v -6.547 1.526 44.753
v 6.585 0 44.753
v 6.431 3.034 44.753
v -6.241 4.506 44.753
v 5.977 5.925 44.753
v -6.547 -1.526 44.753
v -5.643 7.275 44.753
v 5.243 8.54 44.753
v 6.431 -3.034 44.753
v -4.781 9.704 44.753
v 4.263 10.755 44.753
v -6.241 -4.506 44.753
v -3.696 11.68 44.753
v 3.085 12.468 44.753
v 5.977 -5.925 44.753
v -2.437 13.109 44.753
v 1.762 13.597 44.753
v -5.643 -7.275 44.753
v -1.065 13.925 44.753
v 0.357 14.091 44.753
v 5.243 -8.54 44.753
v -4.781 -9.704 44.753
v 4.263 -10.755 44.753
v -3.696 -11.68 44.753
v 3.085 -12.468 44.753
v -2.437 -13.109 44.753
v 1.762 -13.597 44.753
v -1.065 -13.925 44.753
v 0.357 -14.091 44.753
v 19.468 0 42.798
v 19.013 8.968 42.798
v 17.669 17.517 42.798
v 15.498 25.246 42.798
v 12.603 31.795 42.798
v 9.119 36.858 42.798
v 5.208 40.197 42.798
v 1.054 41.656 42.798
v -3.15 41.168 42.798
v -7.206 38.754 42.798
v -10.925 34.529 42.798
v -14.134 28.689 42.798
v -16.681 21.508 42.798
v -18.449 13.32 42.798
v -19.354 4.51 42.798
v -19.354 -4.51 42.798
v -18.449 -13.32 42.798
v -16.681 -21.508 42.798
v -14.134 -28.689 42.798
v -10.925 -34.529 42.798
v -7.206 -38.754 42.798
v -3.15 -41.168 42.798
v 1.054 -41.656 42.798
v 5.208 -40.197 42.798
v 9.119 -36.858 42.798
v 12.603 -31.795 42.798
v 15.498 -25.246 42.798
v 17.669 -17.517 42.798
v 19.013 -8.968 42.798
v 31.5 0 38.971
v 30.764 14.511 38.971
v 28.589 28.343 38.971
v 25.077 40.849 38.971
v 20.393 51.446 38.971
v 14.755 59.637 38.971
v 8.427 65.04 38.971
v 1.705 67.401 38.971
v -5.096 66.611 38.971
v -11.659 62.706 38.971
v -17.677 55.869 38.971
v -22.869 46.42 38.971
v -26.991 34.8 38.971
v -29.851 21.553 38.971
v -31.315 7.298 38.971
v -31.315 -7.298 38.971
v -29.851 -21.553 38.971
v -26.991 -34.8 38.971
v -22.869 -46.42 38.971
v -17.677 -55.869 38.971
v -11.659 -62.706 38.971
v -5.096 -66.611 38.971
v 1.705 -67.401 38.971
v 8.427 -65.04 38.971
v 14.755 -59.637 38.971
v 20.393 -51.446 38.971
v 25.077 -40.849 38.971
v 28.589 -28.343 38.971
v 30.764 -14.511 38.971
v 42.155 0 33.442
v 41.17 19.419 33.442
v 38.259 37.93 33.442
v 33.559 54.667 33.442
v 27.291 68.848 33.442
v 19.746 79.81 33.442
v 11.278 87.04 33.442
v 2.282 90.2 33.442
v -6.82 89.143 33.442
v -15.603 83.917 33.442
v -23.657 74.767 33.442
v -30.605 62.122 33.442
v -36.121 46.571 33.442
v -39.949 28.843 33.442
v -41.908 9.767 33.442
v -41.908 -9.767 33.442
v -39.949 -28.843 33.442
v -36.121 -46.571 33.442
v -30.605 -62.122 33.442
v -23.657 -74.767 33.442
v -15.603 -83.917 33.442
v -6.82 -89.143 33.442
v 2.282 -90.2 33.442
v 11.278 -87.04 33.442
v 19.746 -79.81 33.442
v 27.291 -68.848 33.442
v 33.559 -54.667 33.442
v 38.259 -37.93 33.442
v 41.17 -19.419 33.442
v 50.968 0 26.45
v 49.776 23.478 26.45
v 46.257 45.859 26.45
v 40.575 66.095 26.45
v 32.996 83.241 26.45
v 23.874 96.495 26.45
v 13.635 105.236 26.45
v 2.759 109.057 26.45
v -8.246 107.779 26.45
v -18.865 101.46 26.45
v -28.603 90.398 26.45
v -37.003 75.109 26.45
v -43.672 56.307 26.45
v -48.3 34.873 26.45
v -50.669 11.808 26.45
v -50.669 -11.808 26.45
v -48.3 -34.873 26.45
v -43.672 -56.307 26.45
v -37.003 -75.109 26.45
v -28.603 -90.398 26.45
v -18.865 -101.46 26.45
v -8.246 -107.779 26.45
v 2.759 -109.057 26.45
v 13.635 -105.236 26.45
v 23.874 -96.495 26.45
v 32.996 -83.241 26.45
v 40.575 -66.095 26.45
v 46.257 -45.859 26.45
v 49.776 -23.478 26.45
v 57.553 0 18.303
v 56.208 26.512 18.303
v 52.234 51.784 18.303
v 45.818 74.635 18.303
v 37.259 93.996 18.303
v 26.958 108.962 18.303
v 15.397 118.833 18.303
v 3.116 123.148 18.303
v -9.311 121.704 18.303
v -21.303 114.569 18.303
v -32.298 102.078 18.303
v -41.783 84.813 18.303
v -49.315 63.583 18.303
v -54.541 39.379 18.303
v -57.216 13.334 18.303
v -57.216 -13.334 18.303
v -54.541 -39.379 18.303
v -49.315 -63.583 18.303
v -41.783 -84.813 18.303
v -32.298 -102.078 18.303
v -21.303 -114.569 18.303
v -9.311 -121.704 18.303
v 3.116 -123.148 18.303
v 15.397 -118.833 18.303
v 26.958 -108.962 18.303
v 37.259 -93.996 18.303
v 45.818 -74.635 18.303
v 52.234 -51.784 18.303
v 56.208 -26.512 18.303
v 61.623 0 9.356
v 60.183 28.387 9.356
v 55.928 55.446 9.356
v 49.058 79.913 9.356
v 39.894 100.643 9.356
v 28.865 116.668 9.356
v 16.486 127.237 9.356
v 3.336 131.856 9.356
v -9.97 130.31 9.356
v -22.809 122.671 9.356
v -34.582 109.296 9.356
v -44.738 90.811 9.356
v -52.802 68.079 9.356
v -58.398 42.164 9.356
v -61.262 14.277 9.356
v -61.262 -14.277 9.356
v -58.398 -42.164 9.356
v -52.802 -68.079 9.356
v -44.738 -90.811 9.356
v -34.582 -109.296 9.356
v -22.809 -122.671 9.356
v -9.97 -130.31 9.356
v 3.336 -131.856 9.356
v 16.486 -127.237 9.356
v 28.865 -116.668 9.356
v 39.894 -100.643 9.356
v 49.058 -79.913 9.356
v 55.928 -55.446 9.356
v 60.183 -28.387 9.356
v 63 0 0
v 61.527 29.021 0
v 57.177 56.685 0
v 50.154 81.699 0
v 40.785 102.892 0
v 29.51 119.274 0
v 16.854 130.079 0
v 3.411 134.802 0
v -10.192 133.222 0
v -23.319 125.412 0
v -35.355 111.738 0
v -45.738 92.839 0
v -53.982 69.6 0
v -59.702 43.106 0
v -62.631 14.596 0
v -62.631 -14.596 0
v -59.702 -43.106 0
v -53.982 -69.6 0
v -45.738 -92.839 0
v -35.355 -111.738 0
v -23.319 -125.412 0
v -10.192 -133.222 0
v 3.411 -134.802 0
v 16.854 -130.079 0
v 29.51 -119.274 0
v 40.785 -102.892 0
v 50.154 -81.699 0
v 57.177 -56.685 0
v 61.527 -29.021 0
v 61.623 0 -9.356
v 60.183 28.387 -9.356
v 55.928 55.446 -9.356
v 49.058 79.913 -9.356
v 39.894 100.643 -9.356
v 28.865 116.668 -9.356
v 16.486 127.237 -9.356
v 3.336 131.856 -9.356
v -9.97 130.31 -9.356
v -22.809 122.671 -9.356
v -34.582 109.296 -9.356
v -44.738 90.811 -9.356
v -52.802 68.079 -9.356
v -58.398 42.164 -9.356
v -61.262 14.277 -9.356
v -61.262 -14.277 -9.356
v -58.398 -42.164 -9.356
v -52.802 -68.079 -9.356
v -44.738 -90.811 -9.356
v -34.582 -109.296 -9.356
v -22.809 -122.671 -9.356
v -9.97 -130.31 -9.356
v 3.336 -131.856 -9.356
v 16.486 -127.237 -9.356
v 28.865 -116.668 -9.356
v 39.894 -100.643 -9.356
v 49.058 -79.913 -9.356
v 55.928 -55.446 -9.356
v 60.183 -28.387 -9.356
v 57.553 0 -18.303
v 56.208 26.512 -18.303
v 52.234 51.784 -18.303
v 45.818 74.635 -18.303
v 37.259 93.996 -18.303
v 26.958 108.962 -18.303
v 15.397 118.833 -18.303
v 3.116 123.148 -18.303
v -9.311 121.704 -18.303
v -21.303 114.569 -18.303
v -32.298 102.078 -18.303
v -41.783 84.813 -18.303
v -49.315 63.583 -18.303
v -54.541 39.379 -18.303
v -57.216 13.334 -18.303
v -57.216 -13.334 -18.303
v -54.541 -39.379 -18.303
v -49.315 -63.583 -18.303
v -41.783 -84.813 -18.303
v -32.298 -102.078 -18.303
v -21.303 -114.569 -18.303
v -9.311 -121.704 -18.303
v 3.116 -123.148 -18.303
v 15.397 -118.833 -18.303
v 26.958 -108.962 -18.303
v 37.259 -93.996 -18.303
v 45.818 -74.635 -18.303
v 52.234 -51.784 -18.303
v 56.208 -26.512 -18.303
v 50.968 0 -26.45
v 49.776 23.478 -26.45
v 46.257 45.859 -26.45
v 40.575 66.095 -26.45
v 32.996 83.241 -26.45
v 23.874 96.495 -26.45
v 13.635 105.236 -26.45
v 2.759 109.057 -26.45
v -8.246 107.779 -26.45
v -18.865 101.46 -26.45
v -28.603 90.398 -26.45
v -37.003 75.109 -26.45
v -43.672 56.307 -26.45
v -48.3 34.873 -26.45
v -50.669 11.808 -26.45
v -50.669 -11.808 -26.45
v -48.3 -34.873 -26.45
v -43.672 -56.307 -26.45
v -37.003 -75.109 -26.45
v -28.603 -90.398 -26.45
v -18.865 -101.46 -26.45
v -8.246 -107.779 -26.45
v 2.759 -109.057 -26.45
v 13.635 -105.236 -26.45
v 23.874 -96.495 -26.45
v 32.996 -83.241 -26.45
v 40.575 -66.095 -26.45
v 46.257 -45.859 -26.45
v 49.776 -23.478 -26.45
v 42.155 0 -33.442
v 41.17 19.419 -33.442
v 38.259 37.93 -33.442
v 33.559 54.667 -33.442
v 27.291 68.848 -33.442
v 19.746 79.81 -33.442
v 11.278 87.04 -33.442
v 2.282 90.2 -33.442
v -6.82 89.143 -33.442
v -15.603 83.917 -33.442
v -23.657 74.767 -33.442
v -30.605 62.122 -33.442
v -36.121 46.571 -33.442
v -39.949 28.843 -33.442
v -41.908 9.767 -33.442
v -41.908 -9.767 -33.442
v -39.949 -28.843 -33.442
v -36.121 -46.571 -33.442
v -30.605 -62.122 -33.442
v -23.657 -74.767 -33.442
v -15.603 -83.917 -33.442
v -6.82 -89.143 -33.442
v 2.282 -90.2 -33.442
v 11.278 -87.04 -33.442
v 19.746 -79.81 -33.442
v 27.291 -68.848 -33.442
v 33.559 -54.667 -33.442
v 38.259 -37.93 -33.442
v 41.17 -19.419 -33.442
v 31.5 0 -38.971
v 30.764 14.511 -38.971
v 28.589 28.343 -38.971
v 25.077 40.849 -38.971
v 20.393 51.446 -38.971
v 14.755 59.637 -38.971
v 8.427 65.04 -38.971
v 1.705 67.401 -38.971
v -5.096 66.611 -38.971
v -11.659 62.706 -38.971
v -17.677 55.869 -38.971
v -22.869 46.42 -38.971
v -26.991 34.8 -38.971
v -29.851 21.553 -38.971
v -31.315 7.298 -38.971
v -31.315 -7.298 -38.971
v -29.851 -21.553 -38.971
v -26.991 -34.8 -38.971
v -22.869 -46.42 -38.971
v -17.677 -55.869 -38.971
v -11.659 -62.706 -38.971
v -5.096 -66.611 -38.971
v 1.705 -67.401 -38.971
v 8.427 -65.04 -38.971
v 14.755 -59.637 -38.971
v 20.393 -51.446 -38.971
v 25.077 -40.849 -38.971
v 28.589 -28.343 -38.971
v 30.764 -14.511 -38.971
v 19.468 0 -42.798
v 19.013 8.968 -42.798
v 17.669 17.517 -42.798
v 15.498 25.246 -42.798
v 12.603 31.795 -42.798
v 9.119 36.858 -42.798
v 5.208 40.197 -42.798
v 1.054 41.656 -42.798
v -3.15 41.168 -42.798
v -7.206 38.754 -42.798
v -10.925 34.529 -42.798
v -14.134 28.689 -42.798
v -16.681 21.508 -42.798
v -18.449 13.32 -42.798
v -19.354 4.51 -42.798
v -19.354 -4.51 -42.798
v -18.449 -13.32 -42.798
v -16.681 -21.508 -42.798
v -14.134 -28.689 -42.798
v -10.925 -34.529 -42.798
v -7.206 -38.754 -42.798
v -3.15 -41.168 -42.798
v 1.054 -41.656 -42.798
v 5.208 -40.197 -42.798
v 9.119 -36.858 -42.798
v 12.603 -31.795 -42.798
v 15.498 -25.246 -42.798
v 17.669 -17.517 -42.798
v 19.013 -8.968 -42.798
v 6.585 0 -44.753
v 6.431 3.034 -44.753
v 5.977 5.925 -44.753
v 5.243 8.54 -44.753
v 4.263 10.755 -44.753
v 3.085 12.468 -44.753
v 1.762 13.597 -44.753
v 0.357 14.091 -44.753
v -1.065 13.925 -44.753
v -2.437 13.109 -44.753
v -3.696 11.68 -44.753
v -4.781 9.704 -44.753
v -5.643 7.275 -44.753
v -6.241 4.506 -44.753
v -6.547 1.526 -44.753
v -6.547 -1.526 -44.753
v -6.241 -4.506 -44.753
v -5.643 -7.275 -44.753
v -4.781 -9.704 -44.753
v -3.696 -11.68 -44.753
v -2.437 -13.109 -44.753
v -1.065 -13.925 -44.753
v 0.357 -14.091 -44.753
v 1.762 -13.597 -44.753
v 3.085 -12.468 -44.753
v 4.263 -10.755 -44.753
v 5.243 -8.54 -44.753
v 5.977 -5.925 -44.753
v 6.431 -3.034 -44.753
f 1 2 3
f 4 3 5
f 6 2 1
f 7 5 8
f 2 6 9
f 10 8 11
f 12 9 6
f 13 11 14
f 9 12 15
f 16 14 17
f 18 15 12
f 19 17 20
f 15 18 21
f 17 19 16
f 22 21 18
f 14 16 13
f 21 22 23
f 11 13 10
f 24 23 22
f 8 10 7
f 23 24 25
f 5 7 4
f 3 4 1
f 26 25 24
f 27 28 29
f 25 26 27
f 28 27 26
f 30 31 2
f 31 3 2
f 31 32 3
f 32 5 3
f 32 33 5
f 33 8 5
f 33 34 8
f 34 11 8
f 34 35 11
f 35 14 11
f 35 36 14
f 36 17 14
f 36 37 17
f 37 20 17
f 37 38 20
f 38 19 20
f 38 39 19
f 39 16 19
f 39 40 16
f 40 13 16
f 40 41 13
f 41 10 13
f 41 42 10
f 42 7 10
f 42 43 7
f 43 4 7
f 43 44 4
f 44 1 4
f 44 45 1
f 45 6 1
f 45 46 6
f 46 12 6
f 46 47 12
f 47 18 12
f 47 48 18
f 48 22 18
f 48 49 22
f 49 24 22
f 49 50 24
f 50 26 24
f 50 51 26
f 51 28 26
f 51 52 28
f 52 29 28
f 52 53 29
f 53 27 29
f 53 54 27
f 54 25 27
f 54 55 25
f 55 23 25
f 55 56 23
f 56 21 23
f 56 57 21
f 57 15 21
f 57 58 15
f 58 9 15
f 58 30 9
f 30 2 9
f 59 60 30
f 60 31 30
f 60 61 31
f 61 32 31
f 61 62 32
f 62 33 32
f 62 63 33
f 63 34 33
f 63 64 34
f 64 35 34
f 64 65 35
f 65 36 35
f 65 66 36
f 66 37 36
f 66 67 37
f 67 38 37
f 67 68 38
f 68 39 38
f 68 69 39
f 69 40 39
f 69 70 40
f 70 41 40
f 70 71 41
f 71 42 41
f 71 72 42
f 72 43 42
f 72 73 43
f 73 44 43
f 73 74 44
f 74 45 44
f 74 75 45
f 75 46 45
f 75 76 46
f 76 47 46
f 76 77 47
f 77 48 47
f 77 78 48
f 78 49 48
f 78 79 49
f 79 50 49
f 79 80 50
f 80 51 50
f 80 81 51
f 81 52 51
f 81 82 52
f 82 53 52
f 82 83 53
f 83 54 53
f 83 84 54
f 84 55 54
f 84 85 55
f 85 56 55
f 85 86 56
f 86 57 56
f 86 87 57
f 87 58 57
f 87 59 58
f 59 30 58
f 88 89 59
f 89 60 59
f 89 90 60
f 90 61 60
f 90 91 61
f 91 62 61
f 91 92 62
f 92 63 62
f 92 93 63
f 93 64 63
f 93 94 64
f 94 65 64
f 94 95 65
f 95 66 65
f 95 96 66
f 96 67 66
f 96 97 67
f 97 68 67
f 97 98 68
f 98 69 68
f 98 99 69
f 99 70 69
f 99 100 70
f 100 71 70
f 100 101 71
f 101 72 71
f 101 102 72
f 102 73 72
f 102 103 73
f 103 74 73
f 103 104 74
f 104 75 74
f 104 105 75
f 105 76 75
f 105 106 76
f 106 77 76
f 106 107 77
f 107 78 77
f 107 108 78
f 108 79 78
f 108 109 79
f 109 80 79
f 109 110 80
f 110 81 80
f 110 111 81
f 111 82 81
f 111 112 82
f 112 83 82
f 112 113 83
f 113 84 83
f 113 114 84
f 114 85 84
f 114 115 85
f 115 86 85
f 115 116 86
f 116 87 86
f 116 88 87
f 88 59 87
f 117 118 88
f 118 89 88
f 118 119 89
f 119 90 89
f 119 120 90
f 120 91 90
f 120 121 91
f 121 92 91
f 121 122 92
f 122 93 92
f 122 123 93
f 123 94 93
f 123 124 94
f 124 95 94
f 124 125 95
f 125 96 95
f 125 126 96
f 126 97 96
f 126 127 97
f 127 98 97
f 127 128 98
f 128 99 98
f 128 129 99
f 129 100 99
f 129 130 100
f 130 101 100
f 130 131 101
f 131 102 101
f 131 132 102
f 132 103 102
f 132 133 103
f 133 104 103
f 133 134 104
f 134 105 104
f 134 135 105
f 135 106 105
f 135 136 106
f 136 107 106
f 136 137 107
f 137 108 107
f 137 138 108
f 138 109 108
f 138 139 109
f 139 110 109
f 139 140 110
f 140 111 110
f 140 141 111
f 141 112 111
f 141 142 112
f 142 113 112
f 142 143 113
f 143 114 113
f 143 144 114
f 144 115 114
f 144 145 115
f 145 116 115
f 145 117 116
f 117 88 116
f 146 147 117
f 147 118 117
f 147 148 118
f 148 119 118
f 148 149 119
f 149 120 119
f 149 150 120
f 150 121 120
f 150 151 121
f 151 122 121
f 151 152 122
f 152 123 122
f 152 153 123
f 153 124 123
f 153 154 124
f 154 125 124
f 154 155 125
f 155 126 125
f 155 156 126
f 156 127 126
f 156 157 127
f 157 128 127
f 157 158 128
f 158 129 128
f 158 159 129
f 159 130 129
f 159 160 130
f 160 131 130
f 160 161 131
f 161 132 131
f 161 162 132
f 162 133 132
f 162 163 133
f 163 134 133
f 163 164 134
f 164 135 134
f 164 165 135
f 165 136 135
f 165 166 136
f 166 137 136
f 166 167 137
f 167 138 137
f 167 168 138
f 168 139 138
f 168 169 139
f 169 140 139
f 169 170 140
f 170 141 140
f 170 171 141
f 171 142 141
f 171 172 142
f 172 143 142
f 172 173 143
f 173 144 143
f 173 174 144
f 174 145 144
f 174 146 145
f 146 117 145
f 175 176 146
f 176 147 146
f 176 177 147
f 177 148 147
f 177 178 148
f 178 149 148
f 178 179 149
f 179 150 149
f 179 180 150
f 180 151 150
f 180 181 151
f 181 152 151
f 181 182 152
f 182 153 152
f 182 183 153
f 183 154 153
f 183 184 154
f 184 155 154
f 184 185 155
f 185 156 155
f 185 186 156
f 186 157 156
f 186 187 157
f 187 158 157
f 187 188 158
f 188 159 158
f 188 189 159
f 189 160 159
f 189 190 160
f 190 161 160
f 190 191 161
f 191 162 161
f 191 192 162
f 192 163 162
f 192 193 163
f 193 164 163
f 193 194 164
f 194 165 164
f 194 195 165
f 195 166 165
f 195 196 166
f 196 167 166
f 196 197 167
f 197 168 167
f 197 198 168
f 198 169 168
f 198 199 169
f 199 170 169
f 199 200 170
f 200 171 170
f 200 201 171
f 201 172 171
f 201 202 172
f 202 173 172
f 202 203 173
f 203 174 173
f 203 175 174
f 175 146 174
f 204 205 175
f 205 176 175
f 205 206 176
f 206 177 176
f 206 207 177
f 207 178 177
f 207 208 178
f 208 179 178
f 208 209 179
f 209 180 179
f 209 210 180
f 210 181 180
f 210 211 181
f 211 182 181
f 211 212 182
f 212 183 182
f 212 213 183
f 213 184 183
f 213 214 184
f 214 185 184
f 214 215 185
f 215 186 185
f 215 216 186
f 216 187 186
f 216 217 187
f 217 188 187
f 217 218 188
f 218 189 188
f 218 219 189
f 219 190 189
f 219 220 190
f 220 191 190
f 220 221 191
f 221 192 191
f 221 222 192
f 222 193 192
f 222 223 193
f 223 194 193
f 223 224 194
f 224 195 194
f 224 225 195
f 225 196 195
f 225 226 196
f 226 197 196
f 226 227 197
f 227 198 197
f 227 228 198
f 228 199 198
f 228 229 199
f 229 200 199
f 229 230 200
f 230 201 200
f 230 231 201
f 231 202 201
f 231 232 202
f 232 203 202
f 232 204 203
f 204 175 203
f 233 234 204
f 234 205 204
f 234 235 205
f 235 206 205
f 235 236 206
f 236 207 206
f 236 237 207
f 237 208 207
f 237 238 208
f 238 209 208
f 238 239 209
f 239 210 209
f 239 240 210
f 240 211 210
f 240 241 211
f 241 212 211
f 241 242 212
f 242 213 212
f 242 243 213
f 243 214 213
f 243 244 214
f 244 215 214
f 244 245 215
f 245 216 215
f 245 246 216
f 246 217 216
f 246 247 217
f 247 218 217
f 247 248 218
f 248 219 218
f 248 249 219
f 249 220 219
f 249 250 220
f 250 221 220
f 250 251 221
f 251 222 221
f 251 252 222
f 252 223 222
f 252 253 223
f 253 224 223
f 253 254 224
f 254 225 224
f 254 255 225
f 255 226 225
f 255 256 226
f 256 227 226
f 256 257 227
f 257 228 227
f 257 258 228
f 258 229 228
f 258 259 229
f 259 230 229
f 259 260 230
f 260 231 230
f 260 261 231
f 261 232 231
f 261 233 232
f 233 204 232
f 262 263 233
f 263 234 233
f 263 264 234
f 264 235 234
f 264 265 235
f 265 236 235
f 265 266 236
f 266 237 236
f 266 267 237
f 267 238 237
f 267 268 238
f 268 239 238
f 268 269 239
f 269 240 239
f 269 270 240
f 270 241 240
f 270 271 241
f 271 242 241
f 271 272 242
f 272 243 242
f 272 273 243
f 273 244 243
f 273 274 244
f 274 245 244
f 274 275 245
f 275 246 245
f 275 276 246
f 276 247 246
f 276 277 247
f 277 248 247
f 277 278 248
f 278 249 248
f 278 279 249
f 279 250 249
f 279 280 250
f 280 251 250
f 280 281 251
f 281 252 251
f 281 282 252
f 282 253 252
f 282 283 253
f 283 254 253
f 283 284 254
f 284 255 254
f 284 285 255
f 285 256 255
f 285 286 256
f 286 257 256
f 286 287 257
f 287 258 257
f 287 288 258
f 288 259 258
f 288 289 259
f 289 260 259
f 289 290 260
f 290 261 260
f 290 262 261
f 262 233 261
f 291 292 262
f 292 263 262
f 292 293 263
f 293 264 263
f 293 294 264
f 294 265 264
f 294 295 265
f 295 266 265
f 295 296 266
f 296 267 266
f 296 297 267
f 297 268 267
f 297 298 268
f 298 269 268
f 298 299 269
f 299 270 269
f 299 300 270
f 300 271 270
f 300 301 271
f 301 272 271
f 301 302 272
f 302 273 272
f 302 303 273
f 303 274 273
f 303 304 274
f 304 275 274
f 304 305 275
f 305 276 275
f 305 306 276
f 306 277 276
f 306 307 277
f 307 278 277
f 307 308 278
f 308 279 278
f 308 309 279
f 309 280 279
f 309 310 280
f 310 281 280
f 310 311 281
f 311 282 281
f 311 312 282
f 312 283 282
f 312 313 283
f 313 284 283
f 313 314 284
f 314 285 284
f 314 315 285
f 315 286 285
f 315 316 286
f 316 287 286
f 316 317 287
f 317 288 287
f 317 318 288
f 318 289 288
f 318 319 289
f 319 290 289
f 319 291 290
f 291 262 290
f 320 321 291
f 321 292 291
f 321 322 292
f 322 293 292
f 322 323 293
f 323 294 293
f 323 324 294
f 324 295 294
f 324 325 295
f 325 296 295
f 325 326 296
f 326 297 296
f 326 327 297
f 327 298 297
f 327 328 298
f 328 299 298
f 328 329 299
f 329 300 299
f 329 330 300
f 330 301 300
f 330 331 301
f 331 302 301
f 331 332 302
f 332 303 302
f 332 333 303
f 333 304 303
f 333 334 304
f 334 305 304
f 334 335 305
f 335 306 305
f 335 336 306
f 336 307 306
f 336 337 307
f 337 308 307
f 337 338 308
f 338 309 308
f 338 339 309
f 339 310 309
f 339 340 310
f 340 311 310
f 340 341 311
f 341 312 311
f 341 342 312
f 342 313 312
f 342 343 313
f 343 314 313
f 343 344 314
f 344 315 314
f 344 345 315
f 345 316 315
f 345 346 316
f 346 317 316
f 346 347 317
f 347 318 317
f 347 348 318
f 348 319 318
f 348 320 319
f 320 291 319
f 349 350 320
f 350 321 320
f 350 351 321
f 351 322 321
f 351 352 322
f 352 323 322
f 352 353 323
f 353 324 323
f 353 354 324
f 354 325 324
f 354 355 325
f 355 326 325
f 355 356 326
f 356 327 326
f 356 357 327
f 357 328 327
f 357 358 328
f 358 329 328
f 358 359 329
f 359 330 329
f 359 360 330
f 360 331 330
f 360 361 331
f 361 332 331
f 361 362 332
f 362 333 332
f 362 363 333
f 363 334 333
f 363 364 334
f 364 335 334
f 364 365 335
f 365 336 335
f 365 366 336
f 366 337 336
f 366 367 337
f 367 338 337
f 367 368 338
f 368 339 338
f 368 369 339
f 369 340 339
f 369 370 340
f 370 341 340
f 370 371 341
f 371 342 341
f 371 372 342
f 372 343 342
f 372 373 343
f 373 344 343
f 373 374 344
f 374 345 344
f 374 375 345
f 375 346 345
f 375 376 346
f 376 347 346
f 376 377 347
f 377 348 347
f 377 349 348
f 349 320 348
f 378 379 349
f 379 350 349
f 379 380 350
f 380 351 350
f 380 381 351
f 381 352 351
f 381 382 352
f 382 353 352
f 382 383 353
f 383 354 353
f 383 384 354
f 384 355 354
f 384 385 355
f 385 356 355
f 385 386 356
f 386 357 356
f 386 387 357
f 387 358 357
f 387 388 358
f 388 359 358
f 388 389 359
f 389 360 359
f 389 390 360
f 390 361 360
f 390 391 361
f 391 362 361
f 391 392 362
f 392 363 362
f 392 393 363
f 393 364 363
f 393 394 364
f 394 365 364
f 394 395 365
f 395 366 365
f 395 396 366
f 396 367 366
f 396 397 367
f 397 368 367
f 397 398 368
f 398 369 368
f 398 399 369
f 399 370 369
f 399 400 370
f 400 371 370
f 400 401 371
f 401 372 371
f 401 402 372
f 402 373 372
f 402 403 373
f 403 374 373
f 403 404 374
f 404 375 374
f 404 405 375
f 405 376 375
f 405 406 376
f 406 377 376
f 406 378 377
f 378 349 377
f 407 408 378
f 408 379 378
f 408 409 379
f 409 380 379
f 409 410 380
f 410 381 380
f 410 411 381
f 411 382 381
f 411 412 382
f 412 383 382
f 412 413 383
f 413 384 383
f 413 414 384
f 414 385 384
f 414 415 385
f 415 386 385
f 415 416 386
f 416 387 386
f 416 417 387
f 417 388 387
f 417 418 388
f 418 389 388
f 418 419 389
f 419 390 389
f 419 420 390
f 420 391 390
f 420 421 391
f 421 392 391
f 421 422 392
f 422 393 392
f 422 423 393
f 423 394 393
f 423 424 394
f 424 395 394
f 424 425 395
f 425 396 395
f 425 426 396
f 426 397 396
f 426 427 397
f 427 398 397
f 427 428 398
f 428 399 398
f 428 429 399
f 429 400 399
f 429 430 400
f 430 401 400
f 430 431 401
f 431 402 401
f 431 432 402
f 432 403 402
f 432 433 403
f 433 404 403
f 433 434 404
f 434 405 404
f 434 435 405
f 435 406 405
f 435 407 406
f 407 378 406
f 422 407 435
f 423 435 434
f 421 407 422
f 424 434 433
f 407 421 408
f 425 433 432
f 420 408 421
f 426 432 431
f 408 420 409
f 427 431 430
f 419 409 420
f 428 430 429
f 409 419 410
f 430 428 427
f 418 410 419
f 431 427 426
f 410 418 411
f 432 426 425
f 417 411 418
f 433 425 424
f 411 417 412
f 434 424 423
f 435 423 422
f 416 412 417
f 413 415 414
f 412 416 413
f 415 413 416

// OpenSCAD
// Generated by SolidPython 1.0.1 on 2020-07-29 00:46:48


scale(v = [7, 15, 5]) {
	sphere(r = 9);
}
/***********************************************
*********      SolidPython code:      **********
************************************************
 
# import packages: SolidPython
from solid import *
from solid.utils import *
from itertools import chain, combinations, permutations


class Resize:

    def __init__(self, scad_file):
        self.scad_file = scad_file
        #self.scad_file = import_scad(scad_file)
        # cone/cylinder param:
        self.r1 = 0
        self.r2 = 0
        self.h = 0
        # rectangular prism param:
        self.w = 0
        self.l = 0
        # ellipse param:
        self.r = 0

    # import OpenScad code (file name corresponds to shape)


    # classify shape + parameters
    def assign(self, param1, param2, param3):
        if self.scad_file == 'cone.scad':
            self.r1 = param1
            self.r2 = param2
            self.h = param3
        elif self.scad_file == 'cylinder.scad':
            self.r1 = param1
            self.r2 = param2
            self.h = param3
        elif self.scad_file == 'rectangularPrism.scad':
            self.h = param1
            self.l = param2
            self.w = param3
        else:
            self.r = param1
            self.h = param2

    # resize parameters
    def iterate(self):
        x = range(3, 20, 2)
        i = 1
        if self.scad_file == 'cone.scad':
            tempList = list(permutations(x, 2))
            for temp in tempList:
                param1 = temp[0]
                param2 = temp[1]
                filepath = 'produced_scad_files/' + 'cone' + str(param1) + '_' + str(param2) + '_' + '.scad'
                scad_render_to_file(cylinder(h=param1, r1=param2, r2=0), filepath)

        elif self.scad_file == 'cylinder.scad':
            tempList = list(permutations(x, 3))
            for temp in tempList:
                param1 = temp[0]
                param2 = temp[1]
                filepath = 'produced_scad_files/' + 'cylinder' + str(param1) + '_' + str(param2) + '_' + '.scad'
                scad_render_to_file(cylinder(h=param1, r1=param2, r2=param2), filepath)

        elif self.scad_file == 'rectangularPrism.scad':
            tempList = list(permutations(x, 3))
            for temp in tempList:
                param1 = temp[0]
                param2 = temp[1]
                param3 = temp[2]
                filepath = 'produced_scad_files/' + 'rectangularPrism' + str(param1) + '_' + str(param2) + '_' + str(
                    param3) + '.scad'
                scad_render_to_file(cube(size=(param1, param2, param3)), filepath)

        elif self.scad_file == 'ellipse.scad':
            tempList = list(permutations(x, 4))
            for temp in tempList:
                param1 = temp[0]
                param2 = temp[1]
                param3 = temp[2]
                param4 = temp[3]
                filepath = 'produced_scad_files/' + 'ellipse' + str(param1) + '_' + str(param2) + '_' + str(param3) + '_' + str(param4) + '.scad'
                scad_render_to_file(scale([param1, param2, param3])(sphere(r=param4)), filepath)

    def render_to_scadfile(self):
        scad_render_to_file(scad, 'example.scad') 
 
************************************************/
